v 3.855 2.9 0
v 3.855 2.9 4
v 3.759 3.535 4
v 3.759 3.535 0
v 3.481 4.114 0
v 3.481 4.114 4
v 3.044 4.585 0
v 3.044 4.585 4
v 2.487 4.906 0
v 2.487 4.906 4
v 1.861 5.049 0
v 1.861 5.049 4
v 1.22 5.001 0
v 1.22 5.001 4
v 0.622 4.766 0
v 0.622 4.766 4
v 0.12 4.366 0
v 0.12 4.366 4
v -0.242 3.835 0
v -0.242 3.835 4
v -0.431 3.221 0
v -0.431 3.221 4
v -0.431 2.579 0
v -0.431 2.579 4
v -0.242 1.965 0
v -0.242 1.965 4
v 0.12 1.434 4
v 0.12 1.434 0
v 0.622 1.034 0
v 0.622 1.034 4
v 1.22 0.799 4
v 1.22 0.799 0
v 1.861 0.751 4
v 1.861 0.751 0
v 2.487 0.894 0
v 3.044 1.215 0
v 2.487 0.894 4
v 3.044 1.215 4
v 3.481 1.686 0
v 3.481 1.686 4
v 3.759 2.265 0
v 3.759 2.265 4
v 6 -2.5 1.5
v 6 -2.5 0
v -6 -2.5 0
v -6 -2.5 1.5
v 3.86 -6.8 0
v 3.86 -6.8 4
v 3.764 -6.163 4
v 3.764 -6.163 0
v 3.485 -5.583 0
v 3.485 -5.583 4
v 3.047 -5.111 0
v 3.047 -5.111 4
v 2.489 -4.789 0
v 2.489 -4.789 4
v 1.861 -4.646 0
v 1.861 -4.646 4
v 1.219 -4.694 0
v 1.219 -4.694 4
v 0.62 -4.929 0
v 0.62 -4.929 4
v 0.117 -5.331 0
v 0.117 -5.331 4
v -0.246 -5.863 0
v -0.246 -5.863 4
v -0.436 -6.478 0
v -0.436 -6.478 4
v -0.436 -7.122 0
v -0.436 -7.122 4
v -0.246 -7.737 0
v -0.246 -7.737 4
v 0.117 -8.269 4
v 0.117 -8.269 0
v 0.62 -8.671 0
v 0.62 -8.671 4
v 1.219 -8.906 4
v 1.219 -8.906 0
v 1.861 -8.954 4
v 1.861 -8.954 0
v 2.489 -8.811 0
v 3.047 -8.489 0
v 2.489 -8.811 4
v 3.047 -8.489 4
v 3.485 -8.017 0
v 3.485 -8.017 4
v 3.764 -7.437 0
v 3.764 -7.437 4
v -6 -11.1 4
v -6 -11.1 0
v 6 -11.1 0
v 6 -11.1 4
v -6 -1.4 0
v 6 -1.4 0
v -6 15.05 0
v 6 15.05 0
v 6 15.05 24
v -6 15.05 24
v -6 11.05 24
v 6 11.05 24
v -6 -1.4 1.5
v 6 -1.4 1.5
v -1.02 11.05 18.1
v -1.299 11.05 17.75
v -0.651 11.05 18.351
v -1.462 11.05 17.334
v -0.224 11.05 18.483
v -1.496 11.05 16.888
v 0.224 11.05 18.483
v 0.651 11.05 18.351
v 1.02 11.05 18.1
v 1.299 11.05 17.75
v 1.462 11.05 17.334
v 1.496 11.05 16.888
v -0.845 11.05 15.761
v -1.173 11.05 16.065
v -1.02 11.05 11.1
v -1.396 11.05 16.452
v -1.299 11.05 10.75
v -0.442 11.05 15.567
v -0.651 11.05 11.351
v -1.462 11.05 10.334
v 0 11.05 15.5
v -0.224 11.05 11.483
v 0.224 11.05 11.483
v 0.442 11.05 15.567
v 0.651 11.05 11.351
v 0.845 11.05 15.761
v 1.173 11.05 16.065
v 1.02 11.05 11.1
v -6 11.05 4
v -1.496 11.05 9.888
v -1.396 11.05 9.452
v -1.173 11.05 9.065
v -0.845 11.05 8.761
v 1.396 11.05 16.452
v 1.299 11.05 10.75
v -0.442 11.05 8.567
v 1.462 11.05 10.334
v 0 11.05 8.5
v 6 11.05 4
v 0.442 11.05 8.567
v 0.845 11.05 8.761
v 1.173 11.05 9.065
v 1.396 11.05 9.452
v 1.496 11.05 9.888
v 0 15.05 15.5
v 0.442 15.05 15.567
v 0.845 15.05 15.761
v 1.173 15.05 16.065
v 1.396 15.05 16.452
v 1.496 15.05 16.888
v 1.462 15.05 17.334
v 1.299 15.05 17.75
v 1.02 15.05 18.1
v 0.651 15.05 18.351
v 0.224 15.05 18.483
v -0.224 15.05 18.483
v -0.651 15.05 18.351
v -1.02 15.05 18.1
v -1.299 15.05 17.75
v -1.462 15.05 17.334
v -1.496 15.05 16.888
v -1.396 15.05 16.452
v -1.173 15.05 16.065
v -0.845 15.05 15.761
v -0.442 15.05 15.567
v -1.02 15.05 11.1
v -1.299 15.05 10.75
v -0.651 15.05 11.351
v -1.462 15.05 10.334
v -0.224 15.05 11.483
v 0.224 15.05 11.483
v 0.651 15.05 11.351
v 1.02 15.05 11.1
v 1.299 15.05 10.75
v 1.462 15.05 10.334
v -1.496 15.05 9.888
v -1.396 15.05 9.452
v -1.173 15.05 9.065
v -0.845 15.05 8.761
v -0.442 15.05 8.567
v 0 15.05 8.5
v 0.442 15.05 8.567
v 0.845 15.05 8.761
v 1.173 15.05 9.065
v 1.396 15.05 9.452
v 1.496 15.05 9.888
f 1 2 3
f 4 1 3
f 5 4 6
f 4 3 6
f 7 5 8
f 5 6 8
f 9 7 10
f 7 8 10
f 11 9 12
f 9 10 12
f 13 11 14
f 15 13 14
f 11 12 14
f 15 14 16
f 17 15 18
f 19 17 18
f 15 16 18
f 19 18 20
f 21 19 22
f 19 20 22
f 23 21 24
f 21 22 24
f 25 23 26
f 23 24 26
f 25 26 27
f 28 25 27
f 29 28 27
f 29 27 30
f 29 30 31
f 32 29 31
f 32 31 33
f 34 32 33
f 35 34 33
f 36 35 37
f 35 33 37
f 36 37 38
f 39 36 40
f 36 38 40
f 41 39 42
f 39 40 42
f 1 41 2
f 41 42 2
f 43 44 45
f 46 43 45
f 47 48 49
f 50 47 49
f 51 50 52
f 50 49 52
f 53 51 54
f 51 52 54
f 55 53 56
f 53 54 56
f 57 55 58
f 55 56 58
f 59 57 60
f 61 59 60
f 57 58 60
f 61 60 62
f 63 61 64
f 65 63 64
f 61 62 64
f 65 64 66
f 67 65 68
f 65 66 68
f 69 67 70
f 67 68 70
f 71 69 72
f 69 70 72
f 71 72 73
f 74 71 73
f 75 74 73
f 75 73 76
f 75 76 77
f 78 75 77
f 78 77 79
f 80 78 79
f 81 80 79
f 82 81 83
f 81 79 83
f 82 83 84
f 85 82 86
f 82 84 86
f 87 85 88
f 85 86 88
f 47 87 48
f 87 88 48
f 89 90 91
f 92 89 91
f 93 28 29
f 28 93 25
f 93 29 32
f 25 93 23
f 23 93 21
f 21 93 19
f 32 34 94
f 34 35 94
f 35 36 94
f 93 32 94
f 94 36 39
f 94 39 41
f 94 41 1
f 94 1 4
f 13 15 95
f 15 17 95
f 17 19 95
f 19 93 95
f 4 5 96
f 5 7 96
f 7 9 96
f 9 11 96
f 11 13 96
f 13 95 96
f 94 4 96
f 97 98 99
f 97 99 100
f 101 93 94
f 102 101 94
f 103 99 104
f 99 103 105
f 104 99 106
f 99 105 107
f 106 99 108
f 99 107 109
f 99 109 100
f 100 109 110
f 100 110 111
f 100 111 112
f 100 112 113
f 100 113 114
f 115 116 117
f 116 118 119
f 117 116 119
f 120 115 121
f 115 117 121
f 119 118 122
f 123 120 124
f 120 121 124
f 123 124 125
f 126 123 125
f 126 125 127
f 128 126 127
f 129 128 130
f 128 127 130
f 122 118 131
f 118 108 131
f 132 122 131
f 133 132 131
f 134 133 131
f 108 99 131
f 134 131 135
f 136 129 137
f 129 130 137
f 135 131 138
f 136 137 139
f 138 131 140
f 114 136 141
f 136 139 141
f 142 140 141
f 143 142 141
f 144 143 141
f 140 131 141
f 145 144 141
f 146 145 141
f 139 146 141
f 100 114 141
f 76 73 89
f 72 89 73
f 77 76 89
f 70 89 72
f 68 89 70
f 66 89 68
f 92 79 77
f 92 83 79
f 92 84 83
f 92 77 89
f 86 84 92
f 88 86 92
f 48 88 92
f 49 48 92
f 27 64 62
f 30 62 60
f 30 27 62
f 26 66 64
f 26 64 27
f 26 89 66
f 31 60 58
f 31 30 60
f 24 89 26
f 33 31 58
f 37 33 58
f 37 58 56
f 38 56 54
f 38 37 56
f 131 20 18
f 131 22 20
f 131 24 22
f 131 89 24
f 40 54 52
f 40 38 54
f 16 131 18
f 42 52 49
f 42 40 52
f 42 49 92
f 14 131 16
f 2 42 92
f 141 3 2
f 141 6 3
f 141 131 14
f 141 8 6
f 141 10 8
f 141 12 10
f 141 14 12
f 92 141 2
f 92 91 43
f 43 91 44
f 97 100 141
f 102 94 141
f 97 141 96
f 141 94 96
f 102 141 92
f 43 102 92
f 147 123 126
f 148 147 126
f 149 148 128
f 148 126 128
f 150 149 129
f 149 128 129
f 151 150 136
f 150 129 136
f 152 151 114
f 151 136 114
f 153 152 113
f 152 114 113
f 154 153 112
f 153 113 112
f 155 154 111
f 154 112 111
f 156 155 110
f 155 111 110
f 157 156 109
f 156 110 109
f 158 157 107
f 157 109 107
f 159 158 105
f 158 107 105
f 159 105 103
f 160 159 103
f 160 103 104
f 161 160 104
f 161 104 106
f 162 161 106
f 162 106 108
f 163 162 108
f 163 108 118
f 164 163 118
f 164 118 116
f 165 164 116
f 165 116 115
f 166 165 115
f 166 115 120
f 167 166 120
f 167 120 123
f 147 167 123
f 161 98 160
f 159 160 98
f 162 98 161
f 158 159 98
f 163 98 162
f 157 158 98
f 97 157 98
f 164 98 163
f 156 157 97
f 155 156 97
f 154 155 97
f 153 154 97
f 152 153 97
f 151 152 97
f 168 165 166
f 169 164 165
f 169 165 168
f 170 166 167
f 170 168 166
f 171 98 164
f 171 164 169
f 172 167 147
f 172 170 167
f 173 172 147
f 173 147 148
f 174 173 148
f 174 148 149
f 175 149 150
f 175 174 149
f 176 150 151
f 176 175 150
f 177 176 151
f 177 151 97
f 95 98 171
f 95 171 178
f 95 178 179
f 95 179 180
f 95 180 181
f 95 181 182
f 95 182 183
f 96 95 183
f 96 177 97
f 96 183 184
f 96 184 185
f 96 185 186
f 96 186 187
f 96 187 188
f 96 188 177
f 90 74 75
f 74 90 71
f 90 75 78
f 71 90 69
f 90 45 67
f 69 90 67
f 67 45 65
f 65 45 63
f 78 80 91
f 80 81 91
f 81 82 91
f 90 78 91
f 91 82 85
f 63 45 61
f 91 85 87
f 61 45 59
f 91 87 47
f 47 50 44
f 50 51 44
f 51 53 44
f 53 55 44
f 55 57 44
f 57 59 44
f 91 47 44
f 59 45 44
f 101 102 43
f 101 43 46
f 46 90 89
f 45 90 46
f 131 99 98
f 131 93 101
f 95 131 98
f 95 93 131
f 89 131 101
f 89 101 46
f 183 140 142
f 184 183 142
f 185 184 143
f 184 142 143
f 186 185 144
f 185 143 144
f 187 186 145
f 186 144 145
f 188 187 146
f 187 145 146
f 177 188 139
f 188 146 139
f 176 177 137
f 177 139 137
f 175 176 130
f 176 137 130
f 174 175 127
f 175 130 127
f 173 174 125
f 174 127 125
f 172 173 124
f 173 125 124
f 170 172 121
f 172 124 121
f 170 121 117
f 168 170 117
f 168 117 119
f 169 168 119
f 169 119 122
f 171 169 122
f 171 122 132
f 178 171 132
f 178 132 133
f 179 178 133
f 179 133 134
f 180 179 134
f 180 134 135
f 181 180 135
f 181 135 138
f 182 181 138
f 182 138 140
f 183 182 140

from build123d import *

# Parameters (mm, degrees)
SKETCH_1_W          = 12
SKETCH_1_H          = 22.2
EXTRUDE_1_DEPTH     = 4
SKETCH_2_R          = 2.16
SKETCH_2_R_2        = 2.155
CUT_EXTRUDE_1_DEPTH = 4
CUT_EXTRUDE_2_DEPTH = 1.5
SKETCH_5_W          = 13.387393305
SKETCH_5_H          = 3.9
CUT_EXTRUDE_3_DEPTH = 14.23669143
SKETCH_6_W          = 12
SKETCH_6_H          = 7.85
EXTRUDE_3_DEPTH     = 4
SKETCH_7_W          = 12
SKETCH_7_H          = 4
EXTRUDE_4_DEPTH     = 20
SKETCH_8_R          = 1.5
CUT_EXTRUDE_4_DEPTH = 34.205760042


with BuildPart() as part:
    # 草图1 → 凸台-拉伸1 (new body)
    with BuildSketch(Plane.XY):
        Rectangle(SKETCH_1_W, SKETCH_1_H)
    extrude(amount=EXTRUDE_1_DEPTH)

    # 草图2 → 切除-拉伸1 (cut)
    with BuildSketch(Plane.XY.offset(4)):
        with Locations((1.7, -6.8)):
            Circle(SKETCH_2_R)
        with Locations((1.7, 2.9)):
            Circle(SKETCH_2_R_2)
    extrude(amount=-CUT_EXTRUDE_1_DEPTH, mode=Mode.SUBTRACT)

    # 草图4 → 切除-拉伸2 (cut)
    with BuildSketch(Plane(origin=(0, 0, 0), x_dir=(-1, 0, 0), z_dir=(0, 0, -1))):
        Polygon((-6, -1.4), (-6, -2.5), (-1.7, -2.5), (6, -2.5), (6, -1.4), (-1.7, -1.4), align=None)
    extrude(amount=-CUT_EXTRUDE_2_DEPTH, mode=Mode.SUBTRACT)

    # 草图5 → 切除-拉伸3 (cut, through all)
    with BuildSketch(Plane(origin=(0, 0, 0), x_dir=(-1, 0, 0), z_dir=(0, 0, -1))):
        with Locations((0.693696653, 9.15)):
            Rectangle(SKETCH_5_W, SKETCH_5_H)
    extrude(amount=-CUT_EXTRUDE_3_DEPTH, mode=Mode.SUBTRACT)

    # 草图6 → 凸台-拉伸3 (add)
    with BuildSketch(Plane.XY.offset(4)):
        with Locations((0, 11.125)):
            Rectangle(SKETCH_6_W, SKETCH_6_H)
    extrude(amount=-EXTRUDE_3_DEPTH)

    # 草图7 → 凸台-拉伸4 (add)
    with BuildSketch(Plane.XY.offset(4)):
        with Locations((0, 13.05)):
            Rectangle(SKETCH_7_W, SKETCH_7_H)
    extrude(amount=EXTRUDE_4_DEPTH)

    # 草图8 → 切除-拉伸4 (cut, through all)
    with BuildSketch(Plane.XZ.offset(-11.05)):
        with Locations(Location((0, 10, 0), (0, 0, 270))):
            Circle(SKETCH_8_R)
        with Locations(Location((0, 17, 0), (0, 0, 270))):
            Circle(SKETCH_8_R)
    extrude(amount=-CUT_EXTRUDE_4_DEPTH, mode=Mode.SUBTRACT)


solid = part.part
